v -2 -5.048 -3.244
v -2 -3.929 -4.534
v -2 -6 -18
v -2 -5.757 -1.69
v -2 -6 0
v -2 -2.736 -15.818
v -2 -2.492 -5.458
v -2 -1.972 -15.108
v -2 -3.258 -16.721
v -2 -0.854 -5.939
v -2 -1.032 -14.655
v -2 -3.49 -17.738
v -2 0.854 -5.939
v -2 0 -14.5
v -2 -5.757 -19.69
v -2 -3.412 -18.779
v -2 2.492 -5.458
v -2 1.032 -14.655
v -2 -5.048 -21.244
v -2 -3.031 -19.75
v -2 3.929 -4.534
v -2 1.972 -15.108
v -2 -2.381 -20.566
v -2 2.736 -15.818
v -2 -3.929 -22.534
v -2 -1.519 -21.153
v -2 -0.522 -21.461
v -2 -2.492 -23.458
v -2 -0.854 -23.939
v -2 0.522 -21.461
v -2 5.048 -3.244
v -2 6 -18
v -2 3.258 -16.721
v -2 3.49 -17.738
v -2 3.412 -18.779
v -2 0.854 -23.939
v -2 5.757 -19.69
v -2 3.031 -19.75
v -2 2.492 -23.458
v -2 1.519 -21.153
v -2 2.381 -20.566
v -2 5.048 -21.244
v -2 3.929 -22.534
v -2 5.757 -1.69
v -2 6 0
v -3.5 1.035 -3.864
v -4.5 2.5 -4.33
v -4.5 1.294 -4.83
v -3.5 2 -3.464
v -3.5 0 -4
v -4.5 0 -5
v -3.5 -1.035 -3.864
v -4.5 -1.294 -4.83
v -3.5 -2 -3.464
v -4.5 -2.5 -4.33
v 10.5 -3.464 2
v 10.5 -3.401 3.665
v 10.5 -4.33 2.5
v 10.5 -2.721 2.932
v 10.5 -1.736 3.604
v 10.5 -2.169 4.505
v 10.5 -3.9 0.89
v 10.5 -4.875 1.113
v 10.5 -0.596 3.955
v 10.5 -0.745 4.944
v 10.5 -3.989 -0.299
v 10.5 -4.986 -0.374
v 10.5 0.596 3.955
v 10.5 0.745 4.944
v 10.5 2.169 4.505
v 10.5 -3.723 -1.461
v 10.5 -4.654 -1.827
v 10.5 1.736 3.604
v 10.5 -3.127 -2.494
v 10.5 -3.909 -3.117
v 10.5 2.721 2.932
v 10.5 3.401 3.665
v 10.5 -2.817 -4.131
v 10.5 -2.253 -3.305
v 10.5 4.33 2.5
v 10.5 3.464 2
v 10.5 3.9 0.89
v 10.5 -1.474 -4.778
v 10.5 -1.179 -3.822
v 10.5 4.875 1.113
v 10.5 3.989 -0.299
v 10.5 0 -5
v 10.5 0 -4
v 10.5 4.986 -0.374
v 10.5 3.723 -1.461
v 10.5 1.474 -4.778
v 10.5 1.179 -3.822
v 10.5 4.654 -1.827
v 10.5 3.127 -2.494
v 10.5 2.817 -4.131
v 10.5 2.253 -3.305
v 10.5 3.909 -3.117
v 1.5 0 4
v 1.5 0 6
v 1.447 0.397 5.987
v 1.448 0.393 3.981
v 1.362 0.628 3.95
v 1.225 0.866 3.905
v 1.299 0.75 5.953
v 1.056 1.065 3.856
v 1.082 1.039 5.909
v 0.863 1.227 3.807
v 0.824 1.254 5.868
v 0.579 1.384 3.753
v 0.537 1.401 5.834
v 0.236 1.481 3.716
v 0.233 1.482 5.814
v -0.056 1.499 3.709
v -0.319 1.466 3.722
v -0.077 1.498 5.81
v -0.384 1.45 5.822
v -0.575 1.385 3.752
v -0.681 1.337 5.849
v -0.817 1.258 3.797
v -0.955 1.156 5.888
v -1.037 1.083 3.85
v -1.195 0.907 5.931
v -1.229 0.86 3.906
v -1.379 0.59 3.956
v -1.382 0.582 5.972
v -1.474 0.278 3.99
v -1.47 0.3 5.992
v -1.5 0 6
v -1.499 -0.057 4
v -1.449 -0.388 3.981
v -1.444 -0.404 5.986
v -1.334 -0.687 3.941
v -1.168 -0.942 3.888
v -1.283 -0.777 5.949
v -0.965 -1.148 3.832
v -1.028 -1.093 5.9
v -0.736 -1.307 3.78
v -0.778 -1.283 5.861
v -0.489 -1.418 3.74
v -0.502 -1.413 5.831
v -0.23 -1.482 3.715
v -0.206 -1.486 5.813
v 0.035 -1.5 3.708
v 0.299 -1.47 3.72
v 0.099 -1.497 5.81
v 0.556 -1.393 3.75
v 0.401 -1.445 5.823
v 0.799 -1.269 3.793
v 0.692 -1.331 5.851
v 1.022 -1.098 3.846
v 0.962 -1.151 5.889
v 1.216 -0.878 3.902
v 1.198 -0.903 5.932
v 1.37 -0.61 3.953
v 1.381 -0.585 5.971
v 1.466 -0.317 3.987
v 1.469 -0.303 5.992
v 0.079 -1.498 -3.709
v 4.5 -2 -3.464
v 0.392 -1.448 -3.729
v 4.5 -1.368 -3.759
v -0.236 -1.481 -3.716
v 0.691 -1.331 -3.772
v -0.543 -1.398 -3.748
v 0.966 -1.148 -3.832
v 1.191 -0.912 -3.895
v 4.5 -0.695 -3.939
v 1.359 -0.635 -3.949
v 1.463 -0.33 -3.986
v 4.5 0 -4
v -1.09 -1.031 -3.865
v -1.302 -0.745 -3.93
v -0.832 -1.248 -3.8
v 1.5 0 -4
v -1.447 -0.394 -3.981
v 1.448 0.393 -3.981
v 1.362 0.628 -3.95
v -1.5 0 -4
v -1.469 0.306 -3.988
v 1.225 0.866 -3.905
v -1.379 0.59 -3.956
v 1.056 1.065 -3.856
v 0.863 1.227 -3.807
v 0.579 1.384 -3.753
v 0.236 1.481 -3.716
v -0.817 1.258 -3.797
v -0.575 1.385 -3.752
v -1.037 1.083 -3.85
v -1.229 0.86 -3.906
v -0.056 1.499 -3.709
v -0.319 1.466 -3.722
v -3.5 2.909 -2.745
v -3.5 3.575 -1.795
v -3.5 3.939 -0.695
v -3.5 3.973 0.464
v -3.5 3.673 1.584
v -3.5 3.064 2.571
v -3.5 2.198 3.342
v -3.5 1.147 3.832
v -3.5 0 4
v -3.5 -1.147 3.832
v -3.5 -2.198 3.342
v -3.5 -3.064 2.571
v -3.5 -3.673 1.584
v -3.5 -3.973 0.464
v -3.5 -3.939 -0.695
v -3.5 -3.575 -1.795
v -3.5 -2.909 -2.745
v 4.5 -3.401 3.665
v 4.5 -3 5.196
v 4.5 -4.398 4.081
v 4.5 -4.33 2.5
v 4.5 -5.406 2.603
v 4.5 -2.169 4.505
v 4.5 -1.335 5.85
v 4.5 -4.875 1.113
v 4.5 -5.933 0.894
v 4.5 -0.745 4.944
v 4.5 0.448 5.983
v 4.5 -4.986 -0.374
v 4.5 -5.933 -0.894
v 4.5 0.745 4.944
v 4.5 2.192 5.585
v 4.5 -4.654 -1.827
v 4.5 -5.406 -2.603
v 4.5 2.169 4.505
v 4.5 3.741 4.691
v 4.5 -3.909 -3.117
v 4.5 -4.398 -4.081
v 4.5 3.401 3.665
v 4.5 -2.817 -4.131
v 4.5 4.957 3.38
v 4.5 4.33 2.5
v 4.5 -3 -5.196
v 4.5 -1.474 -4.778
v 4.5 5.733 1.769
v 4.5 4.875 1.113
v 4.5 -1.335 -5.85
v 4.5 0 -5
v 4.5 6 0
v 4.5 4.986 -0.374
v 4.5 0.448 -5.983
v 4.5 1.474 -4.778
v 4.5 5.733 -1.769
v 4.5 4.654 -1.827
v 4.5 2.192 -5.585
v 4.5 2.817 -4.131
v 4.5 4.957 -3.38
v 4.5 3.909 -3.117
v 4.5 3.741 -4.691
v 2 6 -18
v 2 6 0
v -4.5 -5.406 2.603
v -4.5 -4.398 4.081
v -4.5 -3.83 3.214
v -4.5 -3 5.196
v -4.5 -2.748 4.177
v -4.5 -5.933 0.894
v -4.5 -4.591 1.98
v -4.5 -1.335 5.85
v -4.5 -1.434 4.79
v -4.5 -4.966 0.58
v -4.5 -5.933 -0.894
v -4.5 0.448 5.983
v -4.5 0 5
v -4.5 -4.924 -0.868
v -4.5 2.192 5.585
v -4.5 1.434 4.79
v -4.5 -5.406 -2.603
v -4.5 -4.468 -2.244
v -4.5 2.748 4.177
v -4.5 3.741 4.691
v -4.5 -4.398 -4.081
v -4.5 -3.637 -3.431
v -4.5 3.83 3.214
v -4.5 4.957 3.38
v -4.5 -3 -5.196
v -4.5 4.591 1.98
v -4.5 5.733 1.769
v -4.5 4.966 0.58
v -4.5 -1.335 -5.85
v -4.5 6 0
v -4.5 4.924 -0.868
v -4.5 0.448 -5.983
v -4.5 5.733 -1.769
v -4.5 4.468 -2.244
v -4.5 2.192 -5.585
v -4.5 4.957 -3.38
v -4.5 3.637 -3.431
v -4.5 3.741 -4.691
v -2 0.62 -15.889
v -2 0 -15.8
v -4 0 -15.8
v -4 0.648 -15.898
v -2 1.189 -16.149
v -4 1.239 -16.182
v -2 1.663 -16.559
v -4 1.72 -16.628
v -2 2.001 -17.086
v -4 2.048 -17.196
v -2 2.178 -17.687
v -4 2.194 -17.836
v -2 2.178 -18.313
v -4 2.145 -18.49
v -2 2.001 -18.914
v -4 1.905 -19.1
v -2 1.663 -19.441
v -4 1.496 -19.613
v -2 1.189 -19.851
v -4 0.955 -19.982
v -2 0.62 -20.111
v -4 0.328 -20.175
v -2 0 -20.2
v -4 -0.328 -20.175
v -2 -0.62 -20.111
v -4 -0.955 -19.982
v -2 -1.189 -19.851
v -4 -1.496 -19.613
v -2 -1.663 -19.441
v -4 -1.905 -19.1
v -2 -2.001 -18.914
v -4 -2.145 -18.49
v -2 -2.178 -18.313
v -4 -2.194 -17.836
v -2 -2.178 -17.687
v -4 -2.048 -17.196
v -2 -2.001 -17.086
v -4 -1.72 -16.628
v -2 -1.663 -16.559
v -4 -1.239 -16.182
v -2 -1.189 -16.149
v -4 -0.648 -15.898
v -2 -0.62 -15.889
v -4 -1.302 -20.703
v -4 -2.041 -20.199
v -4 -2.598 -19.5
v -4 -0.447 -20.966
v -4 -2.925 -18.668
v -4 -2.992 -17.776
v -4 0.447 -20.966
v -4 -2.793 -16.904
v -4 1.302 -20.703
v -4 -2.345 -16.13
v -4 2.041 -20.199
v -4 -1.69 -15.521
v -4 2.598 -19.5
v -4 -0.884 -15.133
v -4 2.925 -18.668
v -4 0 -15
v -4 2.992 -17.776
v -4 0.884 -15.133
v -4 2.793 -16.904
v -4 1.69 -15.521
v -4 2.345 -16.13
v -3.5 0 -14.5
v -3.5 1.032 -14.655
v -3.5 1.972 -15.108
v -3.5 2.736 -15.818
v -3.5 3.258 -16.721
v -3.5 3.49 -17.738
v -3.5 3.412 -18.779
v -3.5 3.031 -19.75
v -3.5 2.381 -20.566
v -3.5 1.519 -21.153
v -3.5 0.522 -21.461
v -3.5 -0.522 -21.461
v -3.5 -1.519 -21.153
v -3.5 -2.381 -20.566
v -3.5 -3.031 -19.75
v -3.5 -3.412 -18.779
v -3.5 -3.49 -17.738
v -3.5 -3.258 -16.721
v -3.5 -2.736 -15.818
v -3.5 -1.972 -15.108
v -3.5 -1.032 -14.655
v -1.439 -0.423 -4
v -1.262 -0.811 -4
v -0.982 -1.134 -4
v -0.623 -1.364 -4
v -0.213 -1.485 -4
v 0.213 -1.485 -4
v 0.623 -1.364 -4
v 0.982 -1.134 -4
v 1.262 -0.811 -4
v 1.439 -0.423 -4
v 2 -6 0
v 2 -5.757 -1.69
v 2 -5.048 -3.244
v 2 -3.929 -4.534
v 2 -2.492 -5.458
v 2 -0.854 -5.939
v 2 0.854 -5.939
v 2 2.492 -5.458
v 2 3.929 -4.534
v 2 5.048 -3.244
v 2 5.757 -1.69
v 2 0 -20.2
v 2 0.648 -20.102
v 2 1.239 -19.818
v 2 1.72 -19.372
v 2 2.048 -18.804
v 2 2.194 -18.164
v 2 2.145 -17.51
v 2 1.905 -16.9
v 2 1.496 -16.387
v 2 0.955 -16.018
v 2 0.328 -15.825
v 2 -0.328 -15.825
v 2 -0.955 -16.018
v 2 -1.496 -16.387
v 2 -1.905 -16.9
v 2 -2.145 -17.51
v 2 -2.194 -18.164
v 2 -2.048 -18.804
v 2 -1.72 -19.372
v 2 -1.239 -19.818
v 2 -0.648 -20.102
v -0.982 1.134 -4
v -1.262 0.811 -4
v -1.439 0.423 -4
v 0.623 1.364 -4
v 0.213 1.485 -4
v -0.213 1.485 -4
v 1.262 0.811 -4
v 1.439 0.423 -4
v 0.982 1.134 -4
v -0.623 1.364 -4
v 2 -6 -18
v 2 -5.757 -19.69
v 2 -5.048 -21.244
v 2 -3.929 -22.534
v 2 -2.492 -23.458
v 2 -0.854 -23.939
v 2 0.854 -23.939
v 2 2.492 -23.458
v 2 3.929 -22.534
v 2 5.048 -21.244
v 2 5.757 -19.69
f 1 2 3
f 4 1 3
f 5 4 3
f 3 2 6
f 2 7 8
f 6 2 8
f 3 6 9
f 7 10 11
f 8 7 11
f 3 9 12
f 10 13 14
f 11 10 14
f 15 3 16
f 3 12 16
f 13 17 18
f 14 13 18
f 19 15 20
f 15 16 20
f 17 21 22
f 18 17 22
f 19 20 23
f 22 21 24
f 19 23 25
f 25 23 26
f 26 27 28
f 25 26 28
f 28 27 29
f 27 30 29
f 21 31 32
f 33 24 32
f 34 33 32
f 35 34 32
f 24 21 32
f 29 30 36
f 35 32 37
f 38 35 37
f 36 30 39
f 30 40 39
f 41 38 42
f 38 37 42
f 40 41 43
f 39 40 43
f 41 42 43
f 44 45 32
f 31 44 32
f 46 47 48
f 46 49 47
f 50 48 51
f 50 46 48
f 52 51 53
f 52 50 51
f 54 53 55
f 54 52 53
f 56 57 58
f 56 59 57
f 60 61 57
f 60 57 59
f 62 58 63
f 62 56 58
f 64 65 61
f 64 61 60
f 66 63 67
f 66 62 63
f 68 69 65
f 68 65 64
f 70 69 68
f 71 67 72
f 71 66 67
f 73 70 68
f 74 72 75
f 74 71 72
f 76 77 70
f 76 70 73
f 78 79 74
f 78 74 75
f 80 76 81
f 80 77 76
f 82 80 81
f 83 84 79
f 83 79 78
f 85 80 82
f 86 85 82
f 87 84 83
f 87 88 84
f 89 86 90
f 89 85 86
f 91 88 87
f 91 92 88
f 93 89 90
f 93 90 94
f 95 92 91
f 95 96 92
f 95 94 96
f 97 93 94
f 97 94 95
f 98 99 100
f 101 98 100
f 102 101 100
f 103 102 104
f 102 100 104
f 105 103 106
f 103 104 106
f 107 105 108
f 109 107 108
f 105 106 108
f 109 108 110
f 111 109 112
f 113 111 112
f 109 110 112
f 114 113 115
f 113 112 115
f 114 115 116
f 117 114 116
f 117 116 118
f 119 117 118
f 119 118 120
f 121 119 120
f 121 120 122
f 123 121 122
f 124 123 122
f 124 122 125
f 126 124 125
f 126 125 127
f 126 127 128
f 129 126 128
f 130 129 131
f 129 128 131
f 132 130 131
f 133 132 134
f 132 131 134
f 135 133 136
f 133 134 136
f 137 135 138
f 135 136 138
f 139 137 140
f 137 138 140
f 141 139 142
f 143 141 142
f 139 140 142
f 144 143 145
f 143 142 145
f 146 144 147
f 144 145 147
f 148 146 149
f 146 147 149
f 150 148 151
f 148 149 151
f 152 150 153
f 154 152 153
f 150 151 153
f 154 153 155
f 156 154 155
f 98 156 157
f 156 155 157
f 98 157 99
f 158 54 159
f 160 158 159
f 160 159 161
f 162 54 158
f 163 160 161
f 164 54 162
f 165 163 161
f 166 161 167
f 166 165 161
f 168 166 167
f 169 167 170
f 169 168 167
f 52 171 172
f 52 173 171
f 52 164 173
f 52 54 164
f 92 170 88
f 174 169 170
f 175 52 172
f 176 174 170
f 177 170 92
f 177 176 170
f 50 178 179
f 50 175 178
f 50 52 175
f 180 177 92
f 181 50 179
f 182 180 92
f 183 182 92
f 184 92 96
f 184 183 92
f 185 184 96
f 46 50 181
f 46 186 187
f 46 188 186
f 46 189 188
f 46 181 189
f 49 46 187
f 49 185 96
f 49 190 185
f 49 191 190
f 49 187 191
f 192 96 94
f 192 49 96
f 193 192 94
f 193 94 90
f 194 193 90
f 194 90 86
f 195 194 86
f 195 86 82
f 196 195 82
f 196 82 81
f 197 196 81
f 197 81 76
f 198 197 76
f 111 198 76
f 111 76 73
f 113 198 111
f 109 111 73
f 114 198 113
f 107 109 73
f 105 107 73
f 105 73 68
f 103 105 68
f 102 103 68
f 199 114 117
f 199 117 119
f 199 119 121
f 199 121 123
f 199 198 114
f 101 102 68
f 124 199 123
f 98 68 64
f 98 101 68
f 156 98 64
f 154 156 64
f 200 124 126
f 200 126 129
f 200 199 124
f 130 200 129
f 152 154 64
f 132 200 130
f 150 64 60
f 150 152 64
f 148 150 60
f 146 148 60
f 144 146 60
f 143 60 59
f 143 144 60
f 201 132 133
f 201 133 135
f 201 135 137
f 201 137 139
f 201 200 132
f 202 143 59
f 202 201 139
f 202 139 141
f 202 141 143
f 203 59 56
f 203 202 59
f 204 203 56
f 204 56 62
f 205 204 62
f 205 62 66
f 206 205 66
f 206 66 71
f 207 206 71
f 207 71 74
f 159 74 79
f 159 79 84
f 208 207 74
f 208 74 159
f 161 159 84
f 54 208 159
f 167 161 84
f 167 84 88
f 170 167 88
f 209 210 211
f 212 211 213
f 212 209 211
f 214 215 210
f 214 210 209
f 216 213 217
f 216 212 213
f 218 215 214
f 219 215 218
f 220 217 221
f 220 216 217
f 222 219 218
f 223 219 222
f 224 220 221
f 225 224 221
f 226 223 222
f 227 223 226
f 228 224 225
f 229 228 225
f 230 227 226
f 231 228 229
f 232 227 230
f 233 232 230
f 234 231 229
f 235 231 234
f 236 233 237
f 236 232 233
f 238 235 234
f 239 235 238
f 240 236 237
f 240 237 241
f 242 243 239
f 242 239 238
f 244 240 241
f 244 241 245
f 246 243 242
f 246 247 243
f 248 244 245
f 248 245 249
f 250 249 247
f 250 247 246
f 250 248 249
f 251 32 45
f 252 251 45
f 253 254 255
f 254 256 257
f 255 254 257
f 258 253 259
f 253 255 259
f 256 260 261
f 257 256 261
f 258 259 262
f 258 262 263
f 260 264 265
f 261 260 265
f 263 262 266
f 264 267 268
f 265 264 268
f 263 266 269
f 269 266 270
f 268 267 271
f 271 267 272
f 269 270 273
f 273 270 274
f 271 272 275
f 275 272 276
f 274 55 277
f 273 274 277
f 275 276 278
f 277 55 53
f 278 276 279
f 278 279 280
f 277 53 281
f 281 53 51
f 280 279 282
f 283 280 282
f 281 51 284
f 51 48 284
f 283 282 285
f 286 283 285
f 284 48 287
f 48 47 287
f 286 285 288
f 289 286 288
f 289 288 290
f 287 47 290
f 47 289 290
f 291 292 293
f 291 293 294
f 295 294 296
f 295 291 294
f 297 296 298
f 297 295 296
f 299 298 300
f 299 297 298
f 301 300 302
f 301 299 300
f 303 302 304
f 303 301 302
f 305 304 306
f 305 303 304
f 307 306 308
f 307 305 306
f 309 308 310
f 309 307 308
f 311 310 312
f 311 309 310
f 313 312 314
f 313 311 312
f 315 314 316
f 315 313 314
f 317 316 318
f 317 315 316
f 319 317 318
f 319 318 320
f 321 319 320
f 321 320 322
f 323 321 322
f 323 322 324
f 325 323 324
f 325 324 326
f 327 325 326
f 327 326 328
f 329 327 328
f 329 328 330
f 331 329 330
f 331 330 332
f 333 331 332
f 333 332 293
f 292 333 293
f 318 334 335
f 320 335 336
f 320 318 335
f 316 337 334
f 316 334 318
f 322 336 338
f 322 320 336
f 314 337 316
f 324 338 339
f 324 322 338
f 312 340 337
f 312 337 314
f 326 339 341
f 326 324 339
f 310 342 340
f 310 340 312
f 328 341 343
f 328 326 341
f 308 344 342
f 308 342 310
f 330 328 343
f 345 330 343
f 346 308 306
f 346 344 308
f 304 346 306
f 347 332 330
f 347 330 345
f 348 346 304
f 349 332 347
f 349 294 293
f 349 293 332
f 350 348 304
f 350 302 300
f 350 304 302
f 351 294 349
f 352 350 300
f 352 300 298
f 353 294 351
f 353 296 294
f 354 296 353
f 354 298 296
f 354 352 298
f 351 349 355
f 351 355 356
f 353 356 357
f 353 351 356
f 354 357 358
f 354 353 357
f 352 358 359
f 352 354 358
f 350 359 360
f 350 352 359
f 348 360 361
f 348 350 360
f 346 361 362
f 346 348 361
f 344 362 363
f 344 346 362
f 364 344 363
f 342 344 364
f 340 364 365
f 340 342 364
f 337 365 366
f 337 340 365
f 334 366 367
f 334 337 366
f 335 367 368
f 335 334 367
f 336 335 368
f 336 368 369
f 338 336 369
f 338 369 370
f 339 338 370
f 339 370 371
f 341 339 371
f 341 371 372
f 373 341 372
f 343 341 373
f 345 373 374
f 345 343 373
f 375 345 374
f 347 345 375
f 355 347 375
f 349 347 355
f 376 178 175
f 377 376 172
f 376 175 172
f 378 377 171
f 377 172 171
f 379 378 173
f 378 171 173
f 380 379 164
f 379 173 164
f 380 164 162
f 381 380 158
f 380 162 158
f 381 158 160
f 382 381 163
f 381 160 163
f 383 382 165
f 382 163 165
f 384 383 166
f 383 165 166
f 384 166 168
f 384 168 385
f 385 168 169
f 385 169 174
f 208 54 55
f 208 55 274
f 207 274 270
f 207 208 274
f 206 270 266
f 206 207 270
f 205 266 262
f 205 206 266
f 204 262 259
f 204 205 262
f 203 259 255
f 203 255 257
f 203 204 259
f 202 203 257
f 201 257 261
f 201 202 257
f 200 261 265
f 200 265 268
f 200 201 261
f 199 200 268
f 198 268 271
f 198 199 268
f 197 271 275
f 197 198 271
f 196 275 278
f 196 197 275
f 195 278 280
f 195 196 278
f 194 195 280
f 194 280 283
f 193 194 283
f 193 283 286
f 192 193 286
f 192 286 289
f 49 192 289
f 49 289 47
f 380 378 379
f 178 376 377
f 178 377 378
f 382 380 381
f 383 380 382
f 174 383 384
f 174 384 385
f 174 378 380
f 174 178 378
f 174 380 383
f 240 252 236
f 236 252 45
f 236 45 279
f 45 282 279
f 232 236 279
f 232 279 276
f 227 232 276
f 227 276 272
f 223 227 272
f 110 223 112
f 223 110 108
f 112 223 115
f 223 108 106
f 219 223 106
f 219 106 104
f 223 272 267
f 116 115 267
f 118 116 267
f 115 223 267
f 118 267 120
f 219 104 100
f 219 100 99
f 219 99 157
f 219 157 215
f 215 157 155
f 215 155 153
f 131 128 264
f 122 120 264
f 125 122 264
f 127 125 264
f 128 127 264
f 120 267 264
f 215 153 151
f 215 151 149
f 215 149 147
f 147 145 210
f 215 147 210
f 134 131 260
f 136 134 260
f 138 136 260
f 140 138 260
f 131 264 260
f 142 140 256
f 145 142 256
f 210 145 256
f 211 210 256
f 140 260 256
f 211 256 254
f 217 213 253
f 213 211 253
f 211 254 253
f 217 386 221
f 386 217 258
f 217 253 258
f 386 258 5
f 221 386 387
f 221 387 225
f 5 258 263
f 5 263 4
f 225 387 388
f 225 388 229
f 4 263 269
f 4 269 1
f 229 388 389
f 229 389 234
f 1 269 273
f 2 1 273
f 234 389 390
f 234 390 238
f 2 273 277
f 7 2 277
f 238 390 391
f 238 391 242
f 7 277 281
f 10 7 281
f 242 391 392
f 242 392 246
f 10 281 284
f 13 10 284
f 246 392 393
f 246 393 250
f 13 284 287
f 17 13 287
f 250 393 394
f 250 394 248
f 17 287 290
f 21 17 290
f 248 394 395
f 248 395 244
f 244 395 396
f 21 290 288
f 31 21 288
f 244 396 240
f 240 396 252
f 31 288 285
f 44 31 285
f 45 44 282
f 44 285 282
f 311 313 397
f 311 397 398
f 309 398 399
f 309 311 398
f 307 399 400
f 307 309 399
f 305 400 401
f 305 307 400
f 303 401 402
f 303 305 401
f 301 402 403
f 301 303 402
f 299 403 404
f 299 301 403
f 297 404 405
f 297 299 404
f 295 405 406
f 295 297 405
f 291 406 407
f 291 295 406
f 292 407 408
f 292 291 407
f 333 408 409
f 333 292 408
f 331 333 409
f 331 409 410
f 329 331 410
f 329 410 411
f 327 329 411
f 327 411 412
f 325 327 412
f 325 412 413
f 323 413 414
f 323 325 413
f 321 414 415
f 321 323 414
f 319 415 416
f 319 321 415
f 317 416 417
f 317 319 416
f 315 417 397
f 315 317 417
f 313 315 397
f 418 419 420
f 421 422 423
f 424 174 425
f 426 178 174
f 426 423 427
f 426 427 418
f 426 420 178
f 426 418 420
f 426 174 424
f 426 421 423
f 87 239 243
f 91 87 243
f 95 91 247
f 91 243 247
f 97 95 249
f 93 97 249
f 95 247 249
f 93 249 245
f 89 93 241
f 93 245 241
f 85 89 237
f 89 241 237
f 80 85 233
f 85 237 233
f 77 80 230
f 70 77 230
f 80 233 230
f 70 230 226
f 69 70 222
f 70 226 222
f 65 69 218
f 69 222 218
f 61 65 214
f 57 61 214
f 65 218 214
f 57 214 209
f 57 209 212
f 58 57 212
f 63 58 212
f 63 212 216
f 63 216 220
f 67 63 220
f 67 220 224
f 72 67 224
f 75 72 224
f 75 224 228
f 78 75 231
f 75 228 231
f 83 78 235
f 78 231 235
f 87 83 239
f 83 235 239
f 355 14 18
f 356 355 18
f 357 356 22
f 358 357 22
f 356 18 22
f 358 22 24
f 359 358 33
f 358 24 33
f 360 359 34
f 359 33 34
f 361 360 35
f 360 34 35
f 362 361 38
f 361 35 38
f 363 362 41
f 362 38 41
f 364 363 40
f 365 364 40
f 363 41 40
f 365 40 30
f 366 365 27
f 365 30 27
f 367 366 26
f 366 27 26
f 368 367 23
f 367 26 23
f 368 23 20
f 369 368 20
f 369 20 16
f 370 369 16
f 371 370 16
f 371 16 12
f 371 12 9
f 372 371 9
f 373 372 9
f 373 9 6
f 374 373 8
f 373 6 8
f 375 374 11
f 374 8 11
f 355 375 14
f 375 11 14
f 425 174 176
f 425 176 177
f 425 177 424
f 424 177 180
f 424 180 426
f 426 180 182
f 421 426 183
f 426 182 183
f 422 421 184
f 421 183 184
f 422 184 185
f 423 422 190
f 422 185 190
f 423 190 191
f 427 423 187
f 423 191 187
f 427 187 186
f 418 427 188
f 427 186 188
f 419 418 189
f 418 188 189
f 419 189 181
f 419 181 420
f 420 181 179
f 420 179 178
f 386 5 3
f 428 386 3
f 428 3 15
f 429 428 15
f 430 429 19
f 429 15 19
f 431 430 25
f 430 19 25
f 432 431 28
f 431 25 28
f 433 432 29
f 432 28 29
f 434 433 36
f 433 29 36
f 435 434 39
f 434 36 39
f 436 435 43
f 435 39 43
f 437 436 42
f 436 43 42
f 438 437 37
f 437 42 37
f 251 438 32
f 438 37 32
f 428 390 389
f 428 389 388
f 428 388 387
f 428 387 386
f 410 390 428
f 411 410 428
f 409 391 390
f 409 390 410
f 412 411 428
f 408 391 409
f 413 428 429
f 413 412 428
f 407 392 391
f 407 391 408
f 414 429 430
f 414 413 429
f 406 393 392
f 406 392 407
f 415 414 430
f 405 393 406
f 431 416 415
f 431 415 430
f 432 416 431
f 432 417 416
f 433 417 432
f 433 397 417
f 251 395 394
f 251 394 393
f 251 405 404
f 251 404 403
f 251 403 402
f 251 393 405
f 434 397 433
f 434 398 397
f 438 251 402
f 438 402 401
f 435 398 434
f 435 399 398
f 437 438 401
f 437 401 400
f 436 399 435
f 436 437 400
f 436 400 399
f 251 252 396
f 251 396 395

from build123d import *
from build123d.topology import SkipClean

# Parameters (mm, degrees)
EXTRUDE_2_DEPTH          = 4.5
EXTRUDE_2_DEPTH_BACK     = 4.5
CUT_EXTRUDE_1_DEPTH      = 7
CUT_EXTRUDE_1_DEPTH_BACK = 6
CUT_EXTRUDE_2_DEPTH      = 6
CUT_EXTRUDE_2_DEPTH_BACK = 6
SKETCH_10_R              = 2.2
CUT_EXTRUDE_3_DEPTH      = 2.5
SKETCH_13_R              = 3.5
SKETCH_13_R_2            = 2.2
EXTRUDE_3_DEPTH          = 2
CHAMFER_3_SIZE           = 0.5
SKETCH_18_R              = 5
EXTRUDE_5_DEPTH          = 6
SKETCH_19_R              = 4
CUT_EXTRUDE_5_DEPTH      = 16
CHAMFER_4_SIZE           = 1
SKETCH_22_R              = 1.5
CUT_EXTRUDE_6_DEPTH      = 10


with BuildPart() as part:
    # 草图5 → 凸台-拉伸2 (new, two sides: drawn at the far end of the back side and taken through both)
    with BuildSketch(Plane(origin=(0, 0, 0), x_dir=(0, 0, -1), z_dir=(1, 0, 0)).offset(-EXTRUDE_2_DEPTH_BACK)):
        with BuildLine():
            Line((0, -6), (18, -6))
            ThreePointArc((18, -6), (24, 0), (18, 6))
            Line((18, 6), (0, 6))
            ThreePointArc((0, 6), (-6, 0), (0, -6))
        make_face()
    extrude(amount=EXTRUDE_2_DEPTH + EXTRUDE_2_DEPTH_BACK)

    # 草图7 → 切除-拉伸1 (cut, two sides: drawn at the far end of the back side and taken through both)
    with BuildSketch(Plane(origin=(0, 0, 0), x_dir=(0, 0, -1), z_dir=(1, 0, 0)).offset(-CUT_EXTRUDE_1_DEPTH_BACK)):
        with BuildLine():
            ThreePointArc((3.464101615, 2), (-4, 0), (3.464101615, -2))
            ThreePointArc((3.464101615, -2), (4, 0), (3.464101615, 2))
        make_face()
    extrude(amount=CUT_EXTRUDE_1_DEPTH + CUT_EXTRUDE_1_DEPTH_BACK, mode=Mode.SUBTRACT)

    # 草图10 → 切除-拉伸2 (cut, two sides: drawn at the far end of the back side and taken through both)
    with BuildSketch(Plane(origin=(0, 0, 0), x_dir=(0, 0, -1), z_dir=(1, 0, 0)).offset(-CUT_EXTRUDE_2_DEPTH_BACK)):
        with Locations((18, 0)):
            Circle(SKETCH_10_R)
    extrude(amount=CUT_EXTRUDE_2_DEPTH + CUT_EXTRUDE_2_DEPTH_BACK, mode=Mode.SUBTRACT)

    # 草图11 → 切除-拉伸3 (cut)
    with BuildSketch(Plane.ZY.offset(4.5)):
        with BuildLine():
            Line((-18, 6), (0, 6))
            ThreePointArc((0, 6), (-6, 0), (0, -6))
            Line((0, -6), (-18, -6))
            ThreePointArc((-18, -6), (-24, 0), (-18, 6))
        make_face()
    cut_extrude_3 = extrude(amount=-CUT_EXTRUDE_3_DEPTH, mode=Mode.SUBTRACT)

    # 镜向2: 切除-拉伸3 across plane
    add(cut_extrude_3.mirror(Plane(origin=(0, 0, 0), x_dir=(0, 0, 1), z_dir=(1, 0, 0))), mode=Mode.SUBTRACT)

    # 草图13 → 凸台-拉伸3 (add)
    with SkipClean():  # the faces are left unmerged after this step: merging them gives an invalid solid
        with BuildSketch(Plane.ZY.offset(2)):
            with Locations((-18, 0)):
                Circle(SKETCH_13_R)
            with Locations((-18, 0)):
                Circle(SKETCH_13_R_2, mode=Mode.SUBTRACT)
        extrude(amount=EXTRUDE_3_DEPTH)

    # 倒角3
    chamfer_3_edges = [part.edges().sort_by_distance(p)[0] for p in [
        (-4, 0, -21.5),
    ]]
    chamfer(chamfer_3_edges, length=CHAMFER_3_SIZE)

    # 草图18 → 凸台-拉伸5 (add)
    with SkipClean():  # the faces are left unmerged after this step: merging them gives an invalid solid
        with BuildSketch(Plane(origin=(4.5, 0, 0), x_dir=(0, 0, -1), z_dir=(1, 0, 0))):
            Circle(SKETCH_18_R)
        extrude(amount=EXTRUDE_5_DEPTH)

    # 草图19 → 切除-拉伸5 (cut)
    with SkipClean():  # the faces are left unmerged after this step: merging them gives an invalid solid
        with BuildSketch(Plane(origin=(10.5, 0, 0), x_dir=(0, 0, -1), z_dir=(1, 0, 0))):
            Circle(SKETCH_19_R)
        extrude(amount=-CUT_EXTRUDE_5_DEPTH, mode=Mode.SUBTRACT)

    # 倒角4
    chamfer_4_edges = [part.edges().sort_by_distance(p)[0] for p in [
        (-4.5, -1.03527618, -3.863703305),
    ]]
    chamfer(chamfer_4_edges, length=CHAMFER_4_SIZE)

    # 草图22 → 切除-拉伸6 (cut)
    with SkipClean():  # the faces are left unmerged after this step: merging them gives an invalid solid
        with BuildSketch(Plane.XY.offset(6)):
            Circle(SKETCH_22_R)
        extrude(amount=-CUT_EXTRUDE_6_DEPTH, mode=Mode.SUBTRACT)


solid = part.part
